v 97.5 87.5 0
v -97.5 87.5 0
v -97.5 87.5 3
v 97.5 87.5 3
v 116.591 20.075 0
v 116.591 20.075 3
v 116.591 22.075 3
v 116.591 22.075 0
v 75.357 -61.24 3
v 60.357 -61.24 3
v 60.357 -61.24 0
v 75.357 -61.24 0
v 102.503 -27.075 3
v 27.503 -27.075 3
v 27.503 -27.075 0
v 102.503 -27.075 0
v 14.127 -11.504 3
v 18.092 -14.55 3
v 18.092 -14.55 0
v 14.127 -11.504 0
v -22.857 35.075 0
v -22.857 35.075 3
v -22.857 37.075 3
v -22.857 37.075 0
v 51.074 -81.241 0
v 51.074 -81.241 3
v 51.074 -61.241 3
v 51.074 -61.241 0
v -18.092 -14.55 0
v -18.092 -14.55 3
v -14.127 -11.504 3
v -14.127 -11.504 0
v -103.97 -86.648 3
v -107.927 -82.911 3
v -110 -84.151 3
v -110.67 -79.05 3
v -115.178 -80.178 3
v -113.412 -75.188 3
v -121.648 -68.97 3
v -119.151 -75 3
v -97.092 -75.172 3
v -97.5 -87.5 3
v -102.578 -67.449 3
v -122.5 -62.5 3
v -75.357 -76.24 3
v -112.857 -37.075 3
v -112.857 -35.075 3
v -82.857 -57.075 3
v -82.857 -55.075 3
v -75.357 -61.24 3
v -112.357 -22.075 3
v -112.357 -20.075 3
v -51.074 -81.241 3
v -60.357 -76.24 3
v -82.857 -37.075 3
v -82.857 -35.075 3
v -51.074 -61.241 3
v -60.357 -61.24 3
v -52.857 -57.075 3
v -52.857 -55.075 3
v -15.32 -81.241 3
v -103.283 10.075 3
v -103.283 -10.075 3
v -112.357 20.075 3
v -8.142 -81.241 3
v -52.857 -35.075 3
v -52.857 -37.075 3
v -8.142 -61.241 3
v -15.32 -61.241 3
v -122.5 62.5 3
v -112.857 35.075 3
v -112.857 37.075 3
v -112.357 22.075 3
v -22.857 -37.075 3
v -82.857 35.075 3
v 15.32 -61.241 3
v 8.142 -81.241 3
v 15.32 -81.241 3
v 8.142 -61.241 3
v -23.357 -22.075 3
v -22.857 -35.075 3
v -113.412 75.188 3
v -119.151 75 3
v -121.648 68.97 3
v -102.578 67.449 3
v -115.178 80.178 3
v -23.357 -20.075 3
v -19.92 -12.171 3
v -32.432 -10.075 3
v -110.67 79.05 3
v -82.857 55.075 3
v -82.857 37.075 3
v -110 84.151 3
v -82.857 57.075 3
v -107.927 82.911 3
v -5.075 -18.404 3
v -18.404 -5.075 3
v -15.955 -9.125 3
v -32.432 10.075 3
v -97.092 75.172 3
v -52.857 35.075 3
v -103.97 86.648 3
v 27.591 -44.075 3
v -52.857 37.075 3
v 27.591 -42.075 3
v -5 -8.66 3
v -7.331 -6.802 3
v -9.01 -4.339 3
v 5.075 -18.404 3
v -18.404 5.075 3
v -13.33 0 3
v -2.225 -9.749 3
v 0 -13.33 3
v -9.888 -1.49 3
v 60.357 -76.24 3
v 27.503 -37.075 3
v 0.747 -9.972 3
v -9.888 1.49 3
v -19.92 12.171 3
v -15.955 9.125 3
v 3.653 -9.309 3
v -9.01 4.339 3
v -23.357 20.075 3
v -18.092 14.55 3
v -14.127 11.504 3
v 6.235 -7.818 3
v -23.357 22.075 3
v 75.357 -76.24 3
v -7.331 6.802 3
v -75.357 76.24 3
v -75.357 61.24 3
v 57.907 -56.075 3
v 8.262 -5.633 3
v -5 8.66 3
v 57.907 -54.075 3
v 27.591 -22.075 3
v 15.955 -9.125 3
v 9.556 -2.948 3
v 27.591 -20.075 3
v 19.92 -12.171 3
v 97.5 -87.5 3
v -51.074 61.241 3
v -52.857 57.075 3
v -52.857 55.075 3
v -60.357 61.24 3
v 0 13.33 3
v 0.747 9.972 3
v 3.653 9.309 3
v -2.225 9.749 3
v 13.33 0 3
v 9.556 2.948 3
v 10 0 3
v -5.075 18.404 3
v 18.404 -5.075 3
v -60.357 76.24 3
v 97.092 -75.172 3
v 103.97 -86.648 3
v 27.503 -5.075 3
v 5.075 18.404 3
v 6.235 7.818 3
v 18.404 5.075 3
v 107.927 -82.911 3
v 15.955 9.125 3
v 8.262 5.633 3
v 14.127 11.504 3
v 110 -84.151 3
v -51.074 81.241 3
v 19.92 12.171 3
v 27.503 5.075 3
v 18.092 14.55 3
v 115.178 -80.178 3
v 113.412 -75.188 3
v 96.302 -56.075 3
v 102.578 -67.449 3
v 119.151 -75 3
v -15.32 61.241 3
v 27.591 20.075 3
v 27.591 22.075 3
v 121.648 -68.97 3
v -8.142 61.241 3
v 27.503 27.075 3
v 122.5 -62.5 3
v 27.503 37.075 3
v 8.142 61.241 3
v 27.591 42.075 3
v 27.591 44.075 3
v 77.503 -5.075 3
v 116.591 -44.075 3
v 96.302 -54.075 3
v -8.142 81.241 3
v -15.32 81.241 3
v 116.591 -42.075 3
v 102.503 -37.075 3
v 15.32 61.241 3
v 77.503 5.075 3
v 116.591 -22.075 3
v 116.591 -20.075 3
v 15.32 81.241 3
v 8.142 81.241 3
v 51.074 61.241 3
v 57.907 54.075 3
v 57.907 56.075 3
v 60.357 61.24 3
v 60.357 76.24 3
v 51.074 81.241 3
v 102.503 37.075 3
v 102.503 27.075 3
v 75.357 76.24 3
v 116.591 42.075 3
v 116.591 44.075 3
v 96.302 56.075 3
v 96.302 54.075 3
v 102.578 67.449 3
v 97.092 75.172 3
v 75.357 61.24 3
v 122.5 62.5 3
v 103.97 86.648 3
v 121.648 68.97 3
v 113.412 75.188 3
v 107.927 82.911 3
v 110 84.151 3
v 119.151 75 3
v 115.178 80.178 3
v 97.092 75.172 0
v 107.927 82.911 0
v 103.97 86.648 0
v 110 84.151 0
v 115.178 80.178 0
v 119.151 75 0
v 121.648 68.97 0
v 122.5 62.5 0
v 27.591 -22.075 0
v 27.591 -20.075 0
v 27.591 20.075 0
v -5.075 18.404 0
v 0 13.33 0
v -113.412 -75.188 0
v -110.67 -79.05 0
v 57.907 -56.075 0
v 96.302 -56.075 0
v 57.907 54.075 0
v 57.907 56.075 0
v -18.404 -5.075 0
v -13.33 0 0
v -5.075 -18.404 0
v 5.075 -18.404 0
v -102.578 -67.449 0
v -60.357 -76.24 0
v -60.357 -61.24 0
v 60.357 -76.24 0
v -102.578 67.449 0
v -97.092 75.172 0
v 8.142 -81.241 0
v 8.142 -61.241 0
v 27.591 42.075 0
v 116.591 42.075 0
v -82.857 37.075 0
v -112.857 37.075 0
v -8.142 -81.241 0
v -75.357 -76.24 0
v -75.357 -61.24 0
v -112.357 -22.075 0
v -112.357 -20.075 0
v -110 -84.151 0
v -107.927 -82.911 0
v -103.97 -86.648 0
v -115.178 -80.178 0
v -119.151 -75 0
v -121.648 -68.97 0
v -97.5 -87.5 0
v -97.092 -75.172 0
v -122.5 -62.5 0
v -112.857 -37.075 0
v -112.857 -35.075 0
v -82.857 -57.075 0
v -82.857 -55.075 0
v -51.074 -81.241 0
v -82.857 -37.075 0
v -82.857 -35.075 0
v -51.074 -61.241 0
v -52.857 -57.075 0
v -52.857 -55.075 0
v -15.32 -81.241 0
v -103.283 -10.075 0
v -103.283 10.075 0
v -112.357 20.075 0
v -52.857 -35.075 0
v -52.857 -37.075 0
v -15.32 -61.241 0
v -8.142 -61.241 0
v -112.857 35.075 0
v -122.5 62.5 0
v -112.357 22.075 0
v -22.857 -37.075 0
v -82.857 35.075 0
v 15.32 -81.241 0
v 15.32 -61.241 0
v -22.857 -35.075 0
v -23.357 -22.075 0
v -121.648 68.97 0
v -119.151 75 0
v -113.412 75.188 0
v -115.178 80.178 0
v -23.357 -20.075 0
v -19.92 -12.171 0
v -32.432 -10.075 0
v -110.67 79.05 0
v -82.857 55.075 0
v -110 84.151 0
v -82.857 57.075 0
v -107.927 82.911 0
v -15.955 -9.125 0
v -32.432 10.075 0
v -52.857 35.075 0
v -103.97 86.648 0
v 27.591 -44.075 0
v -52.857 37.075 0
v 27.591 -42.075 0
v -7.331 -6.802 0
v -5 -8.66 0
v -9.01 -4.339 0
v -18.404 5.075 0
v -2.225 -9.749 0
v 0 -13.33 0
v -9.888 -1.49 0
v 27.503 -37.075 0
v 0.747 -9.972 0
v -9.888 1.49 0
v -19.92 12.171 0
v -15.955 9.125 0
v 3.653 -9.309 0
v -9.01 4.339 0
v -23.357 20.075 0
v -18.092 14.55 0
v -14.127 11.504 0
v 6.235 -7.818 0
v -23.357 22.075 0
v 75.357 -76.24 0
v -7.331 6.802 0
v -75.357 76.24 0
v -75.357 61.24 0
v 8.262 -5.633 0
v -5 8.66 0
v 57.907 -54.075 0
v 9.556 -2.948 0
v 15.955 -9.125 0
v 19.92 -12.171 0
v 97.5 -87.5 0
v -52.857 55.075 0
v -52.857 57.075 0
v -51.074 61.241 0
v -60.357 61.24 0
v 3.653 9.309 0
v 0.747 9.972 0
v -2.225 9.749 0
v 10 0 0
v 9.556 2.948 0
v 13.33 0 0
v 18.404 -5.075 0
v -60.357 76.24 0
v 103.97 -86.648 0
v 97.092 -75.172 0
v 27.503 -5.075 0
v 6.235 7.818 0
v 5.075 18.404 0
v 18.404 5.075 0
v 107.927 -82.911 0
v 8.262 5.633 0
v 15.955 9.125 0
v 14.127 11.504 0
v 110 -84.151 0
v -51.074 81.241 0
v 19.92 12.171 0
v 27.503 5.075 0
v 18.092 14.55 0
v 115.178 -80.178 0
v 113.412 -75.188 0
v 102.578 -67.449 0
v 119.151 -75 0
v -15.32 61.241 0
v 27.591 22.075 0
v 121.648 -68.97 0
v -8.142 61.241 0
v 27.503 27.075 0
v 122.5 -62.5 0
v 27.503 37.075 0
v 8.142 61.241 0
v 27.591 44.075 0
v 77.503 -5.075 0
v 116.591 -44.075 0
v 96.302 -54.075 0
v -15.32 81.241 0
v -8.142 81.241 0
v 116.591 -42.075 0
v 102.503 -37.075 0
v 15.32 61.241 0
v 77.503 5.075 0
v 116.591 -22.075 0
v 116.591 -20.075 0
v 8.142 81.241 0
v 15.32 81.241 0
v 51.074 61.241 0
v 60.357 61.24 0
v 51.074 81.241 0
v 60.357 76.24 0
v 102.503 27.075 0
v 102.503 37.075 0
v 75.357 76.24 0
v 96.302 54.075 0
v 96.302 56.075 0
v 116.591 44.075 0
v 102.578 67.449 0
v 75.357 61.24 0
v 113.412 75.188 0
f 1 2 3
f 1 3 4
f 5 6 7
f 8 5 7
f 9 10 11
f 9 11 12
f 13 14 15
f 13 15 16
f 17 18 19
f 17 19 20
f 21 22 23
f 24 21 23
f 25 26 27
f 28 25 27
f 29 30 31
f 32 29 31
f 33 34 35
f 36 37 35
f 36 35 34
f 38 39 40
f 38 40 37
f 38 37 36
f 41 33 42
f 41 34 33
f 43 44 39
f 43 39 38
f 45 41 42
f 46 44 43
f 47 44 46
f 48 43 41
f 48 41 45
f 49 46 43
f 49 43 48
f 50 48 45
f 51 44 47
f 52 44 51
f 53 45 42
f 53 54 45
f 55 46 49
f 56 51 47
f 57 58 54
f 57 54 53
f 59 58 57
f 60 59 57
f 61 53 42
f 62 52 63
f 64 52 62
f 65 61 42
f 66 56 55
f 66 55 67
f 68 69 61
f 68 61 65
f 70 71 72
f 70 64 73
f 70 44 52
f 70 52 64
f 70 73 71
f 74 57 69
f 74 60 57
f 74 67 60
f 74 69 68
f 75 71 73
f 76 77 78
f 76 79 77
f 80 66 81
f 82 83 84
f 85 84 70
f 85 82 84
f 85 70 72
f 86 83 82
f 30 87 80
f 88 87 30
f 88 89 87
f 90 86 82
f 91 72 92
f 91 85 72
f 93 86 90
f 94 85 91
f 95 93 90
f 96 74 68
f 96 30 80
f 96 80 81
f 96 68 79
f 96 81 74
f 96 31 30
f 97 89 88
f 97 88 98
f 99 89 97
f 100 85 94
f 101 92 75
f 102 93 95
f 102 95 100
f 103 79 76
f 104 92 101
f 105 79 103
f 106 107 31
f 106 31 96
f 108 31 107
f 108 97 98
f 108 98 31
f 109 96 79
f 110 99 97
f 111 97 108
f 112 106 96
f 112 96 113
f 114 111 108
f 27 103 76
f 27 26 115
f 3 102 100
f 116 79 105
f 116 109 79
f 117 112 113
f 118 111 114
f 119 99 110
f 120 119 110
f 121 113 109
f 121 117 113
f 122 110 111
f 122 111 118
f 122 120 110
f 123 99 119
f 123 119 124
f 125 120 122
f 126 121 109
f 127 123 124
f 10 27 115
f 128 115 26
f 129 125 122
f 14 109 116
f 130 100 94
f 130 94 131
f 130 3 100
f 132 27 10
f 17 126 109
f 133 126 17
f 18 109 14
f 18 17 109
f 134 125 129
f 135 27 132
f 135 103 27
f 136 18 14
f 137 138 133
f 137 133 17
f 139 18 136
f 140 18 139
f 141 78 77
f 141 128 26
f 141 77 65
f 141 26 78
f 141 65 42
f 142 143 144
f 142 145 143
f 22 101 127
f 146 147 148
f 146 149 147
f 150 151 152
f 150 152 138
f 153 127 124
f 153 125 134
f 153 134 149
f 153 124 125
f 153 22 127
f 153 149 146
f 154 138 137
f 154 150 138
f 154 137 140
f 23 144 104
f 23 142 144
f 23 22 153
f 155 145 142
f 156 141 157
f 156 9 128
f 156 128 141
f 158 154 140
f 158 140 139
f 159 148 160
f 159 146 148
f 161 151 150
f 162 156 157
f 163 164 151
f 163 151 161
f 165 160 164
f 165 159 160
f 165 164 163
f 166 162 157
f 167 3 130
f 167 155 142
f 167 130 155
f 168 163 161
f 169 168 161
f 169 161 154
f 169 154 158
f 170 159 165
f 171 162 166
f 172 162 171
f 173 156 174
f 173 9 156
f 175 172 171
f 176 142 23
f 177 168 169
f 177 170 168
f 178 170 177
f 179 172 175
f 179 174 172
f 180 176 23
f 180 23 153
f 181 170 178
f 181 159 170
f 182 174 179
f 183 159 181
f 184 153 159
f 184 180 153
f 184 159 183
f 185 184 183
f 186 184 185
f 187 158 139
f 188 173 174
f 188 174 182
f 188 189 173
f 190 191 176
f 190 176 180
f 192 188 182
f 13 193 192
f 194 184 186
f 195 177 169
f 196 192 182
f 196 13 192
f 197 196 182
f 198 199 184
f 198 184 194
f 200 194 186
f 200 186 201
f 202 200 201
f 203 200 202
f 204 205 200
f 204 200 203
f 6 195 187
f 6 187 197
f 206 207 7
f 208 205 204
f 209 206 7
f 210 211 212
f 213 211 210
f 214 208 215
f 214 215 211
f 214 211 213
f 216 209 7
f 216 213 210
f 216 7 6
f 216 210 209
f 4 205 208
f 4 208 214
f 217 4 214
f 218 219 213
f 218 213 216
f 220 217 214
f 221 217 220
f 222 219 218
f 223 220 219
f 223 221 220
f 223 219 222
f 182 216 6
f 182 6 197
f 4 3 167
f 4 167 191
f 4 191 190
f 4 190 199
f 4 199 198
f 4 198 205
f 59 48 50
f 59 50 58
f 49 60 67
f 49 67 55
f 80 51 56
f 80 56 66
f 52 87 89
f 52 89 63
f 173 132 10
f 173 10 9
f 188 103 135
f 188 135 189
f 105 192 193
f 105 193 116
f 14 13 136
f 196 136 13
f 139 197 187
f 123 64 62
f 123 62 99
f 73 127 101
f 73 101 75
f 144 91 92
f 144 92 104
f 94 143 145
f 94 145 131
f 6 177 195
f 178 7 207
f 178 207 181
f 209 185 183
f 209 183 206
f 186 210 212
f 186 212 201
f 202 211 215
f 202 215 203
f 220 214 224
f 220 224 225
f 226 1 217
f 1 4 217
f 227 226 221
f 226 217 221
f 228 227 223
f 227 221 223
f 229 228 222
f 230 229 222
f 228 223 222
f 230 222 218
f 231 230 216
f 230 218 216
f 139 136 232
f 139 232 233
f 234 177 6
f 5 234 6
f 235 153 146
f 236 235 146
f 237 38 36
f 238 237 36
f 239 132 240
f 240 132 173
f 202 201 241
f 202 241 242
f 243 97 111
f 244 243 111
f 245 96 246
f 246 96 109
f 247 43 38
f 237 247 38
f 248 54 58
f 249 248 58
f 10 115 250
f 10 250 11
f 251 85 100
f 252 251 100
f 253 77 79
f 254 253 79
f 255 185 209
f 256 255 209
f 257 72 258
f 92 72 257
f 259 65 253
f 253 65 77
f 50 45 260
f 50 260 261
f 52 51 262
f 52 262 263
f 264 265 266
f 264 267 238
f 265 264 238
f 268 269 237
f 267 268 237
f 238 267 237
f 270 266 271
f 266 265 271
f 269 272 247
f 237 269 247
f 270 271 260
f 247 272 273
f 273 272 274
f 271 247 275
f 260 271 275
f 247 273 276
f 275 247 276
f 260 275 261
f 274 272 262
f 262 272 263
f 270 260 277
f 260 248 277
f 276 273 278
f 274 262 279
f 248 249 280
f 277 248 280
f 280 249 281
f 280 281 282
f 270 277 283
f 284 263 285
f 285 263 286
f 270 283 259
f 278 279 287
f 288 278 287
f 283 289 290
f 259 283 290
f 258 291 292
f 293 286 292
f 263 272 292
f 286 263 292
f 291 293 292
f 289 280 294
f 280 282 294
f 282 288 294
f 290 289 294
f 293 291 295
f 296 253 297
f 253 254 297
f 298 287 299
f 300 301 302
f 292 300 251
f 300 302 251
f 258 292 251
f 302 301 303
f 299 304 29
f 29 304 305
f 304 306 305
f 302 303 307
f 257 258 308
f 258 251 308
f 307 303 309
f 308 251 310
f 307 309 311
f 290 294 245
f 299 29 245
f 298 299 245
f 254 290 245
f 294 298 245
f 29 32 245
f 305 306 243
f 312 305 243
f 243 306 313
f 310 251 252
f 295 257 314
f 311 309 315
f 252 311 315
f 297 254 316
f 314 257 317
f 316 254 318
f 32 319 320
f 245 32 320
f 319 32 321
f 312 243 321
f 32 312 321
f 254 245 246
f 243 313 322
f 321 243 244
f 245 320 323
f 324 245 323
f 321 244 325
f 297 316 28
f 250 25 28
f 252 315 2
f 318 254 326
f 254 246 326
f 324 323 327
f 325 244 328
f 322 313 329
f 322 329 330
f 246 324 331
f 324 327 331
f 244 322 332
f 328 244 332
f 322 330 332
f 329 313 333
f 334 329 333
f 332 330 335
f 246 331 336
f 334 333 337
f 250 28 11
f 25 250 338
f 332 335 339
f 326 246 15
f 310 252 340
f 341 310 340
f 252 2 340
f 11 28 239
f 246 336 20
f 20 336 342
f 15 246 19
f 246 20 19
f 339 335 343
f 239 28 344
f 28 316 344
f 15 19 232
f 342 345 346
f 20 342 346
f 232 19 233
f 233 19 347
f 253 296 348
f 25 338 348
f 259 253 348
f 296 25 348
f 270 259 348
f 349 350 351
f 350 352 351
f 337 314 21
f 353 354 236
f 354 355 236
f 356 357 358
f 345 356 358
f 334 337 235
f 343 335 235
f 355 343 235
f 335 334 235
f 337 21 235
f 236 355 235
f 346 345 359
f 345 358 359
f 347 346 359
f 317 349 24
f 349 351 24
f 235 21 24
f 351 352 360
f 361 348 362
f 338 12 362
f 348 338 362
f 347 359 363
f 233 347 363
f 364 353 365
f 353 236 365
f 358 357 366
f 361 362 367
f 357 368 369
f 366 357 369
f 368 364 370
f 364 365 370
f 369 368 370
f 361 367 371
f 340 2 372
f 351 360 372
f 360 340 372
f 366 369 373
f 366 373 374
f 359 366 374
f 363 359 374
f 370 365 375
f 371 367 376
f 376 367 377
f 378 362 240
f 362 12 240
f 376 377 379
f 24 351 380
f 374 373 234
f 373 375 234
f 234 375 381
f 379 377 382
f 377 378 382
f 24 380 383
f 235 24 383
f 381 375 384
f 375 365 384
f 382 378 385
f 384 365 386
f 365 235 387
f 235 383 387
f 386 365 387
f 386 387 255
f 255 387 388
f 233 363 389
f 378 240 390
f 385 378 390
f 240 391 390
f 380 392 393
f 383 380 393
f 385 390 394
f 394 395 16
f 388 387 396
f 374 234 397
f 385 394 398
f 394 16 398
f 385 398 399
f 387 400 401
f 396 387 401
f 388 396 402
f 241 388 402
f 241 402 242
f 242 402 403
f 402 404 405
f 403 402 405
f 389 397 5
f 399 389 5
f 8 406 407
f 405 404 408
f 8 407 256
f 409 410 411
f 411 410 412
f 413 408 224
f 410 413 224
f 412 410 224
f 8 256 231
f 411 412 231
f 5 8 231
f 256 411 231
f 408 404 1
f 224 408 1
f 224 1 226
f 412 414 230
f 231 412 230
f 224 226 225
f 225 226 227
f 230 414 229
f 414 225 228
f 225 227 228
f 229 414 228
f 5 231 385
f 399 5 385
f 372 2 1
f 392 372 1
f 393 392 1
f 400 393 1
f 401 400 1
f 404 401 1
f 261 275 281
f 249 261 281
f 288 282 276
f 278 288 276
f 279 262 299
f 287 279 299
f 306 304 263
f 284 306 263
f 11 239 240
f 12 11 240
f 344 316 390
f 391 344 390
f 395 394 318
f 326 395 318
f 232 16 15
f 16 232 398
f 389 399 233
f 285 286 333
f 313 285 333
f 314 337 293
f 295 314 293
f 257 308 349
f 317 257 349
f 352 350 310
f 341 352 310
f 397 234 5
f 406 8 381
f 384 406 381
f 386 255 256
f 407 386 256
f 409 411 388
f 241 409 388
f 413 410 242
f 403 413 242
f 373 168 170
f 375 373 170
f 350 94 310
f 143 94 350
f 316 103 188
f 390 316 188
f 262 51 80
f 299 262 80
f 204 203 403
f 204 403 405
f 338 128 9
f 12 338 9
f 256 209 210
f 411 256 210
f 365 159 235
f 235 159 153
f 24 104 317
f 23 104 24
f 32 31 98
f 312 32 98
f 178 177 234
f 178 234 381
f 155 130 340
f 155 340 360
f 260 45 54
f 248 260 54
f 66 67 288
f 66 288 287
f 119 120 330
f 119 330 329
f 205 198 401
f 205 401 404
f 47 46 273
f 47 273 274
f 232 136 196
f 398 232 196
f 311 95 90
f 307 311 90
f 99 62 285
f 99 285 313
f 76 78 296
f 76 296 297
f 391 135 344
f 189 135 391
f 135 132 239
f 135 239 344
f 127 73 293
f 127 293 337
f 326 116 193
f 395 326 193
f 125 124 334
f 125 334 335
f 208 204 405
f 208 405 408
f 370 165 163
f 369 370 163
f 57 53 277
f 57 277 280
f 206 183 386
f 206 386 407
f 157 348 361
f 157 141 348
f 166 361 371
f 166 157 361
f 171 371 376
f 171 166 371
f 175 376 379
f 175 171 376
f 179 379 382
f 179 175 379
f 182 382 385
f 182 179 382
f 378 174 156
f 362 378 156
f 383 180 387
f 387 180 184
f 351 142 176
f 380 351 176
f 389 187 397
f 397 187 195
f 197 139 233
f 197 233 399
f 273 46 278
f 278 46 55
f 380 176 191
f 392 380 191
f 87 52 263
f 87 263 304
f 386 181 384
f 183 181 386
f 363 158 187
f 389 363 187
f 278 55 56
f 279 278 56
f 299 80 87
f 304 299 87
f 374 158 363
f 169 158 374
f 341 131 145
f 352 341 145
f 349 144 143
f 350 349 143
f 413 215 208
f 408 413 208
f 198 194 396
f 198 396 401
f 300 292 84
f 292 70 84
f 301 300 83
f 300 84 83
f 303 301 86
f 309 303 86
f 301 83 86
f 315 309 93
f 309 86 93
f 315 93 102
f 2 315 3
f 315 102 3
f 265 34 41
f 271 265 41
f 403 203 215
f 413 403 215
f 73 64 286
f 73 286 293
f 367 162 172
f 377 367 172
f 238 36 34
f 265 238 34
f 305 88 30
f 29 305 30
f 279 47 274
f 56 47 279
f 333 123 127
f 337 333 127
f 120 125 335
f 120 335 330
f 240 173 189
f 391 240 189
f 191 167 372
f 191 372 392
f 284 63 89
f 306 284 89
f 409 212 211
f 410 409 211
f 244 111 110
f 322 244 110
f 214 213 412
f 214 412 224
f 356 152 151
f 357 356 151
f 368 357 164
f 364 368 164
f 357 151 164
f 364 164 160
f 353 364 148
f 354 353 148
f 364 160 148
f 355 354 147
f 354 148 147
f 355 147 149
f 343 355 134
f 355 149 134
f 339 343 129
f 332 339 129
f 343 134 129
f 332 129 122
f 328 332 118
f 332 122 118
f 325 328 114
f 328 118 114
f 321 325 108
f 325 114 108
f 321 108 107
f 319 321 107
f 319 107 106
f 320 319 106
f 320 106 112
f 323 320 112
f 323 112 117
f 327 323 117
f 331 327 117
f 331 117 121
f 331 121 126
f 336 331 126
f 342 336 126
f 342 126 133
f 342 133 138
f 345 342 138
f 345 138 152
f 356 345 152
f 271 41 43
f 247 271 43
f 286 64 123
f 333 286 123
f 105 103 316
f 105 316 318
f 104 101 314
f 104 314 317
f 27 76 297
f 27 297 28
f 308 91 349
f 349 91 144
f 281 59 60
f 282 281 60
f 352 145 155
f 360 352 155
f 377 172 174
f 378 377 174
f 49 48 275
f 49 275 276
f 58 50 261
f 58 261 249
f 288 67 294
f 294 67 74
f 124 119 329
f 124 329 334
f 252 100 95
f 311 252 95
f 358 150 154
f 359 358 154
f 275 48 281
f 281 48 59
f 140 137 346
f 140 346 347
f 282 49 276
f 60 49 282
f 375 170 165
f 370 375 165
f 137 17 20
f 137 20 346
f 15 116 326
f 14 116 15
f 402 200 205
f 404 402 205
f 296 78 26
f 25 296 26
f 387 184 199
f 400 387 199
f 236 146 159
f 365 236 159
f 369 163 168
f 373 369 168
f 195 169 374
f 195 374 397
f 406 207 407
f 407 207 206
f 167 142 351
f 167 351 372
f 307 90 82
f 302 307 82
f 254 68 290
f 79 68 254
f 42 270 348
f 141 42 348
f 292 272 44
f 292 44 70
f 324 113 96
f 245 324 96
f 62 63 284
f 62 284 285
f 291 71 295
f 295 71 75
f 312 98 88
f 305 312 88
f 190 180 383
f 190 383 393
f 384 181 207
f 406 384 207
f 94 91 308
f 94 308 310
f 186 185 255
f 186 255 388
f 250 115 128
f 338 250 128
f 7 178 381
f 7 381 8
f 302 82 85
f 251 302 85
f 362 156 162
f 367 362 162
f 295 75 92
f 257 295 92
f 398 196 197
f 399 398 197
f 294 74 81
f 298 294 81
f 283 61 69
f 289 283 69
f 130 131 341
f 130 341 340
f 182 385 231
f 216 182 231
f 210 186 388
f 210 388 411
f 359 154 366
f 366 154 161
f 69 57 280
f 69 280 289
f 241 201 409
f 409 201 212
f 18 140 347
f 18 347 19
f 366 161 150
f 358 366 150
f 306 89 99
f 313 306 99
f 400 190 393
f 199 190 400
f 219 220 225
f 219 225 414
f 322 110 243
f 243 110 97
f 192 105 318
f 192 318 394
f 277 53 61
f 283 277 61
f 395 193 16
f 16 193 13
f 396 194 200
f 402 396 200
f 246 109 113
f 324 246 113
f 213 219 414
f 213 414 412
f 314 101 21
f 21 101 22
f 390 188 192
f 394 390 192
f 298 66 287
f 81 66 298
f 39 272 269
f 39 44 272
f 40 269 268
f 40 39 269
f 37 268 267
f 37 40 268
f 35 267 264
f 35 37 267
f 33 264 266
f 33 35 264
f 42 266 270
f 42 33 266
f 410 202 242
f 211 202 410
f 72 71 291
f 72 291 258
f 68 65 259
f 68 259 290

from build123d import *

# Parameters (mm, degrees)
SKETCH1_W           = 245
SKETCH1_H           = 175
BOSS_EXTRUDE1_DEPTH = 3
SKETCH2_W           = 30
SKETCH2_H           = 2
SKETCH2_W_2         = 70.850822781
SKETCH2_H_2         = 20.149065526
SKETCH2_W_3         = 88.999828845
SKETCH2_W_4         = 16.284036158
SKETCH2_H_3         = 20
SKETCH2_W_5         = 35.753967601
SKETCH2_W_6         = 15
SKETCH2_H_4         = 15
SKETCH2_R           = 10
CUT_EXTRUDE1_DEPTH  = 151.570581456
FILLET1_R           = 25
SKETCH2_4_W         = 89
SKETCH2_4_H         = 2
SKETCH2_4_W_2       = 50
SKETCH2_4_H_2       = 10.149065526
SKETCH2_4_W_3       = 75
SKETCH2_4_H_3       = 10
SKETCH2_4_W_4       = 15
SKETCH2_4_H_4       = 15
SKETCH2_4_W_5       = 35.753967601
SKETCH2_4_H_5       = 20
SKETCH2_4_W_6       = 38.395009933
CUT_EXTRUDE2_DEPTH  = 10
SKETCH2_5_W         = 16.284036158
SKETCH2_5_H         = 20
CUT_EXTRUDE3_DEPTH  = 10
CUT_EXTRUDE4_DEPTH  = 10
CUT_EXTRUDE5_DEPTH  = 10


with BuildPart() as part:
    # Sketch1 → Boss-Extrude1 (new body)
    with BuildSketch(Plane.XY):
        Rectangle(SKETCH1_W, SKETCH1_H)
    extrude(amount=BOSS_EXTRUDE1_DEPTH)

    # Sketch2 → Cut-Extrude1 (cut, through all)
    with BuildSketch(Plane.XY.offset(3)):
        with Locations((-37.857152872, 36.074532763)):
            Rectangle(SKETCH2_W, SKETCH2_H)
        with Locations((-67.857152873, 0)):
            Rectangle(SKETCH2_W_2, SKETCH2_H_2)
        with Locations((-67.857152873, 21.074532763)):
            Rectangle(SKETCH2_W_3, SKETCH2_H)
        with Locations((-97.857152872, 36.074532763)):
            Rectangle(SKETCH2_W, SKETCH2_H)
        with Locations((-67.857152872, 56.074532763)):
            Rectangle(SKETCH2_W, SKETCH2_H)
        with Locations((0, 71.241154444)):
            Rectangle(SKETCH2_W_4, SKETCH2_H_3)
        with Locations((-33.197326406, 71.241154444)):
            Rectangle(SKETCH2_W_5, SKETCH2_H_3)
        with Locations((-67.857152872, 68.74)):
            Rectangle(SKETCH2_W_6, SKETCH2_H_4)
        Polygon((-110.669619636, 79.049728312), (-113.412388394, 75.188417537), (-102.577806523, 67.449430486), (-97.092269008, 75.172052036), (-107.926850879, 82.911039086), align=None)
        Polygon((-110.669619636, -79.049728312), (-107.926850879, -82.911039086), (-97.092269008, -75.172052036), (-102.577806523, -67.449430486), (-113.412388394, -75.188417537), align=None)
        with Locations((-67.857152872, -68.74)):
            Rectangle(SKETCH2_W_6, SKETCH2_H_4)
        with Locations((-33.197326406, -71.241154444)):
            Rectangle(SKETCH2_W_5, SKETCH2_H_3)
        with Locations((-67.857152872, -56.074532763)):
            Rectangle(SKETCH2_W, SKETCH2_H)
        with Locations((-97.857152872, -36.074532763)):
            Rectangle(SKETCH2_W, SKETCH2_H)
        with Locations((-37.857152872, -36.074532763)):
            Rectangle(SKETCH2_W, SKETCH2_H)
        with Locations((-67.857152873, -21.074532763)):
            Rectangle(SKETCH2_W_3, SKETCH2_H)
        Circle(SKETCH2_R)
    extrude(amount=-CUT_EXTRUDE1_DEPTH, mode=Mode.SUBTRACT)

    # Fillet1
    fillet1_edges = [part.edges().sort_by_distance(p)[0] for p in [
        (-122.5, -87.5, 1.5),
        (122.5, -87.5, 1.5),
        (122.5, 87.5, 1.5),
        (-122.5, 87.5, 1.5),
    ]]
    fillet(fillet1_edges, radius=FILLET1_R)

    # Sketch2<4> → Cut-Extrude2 (cut)
    with BuildSketch(Plane.XY.offset(3)):
        with Locations((72.091101618, -43.074532763)):
            Rectangle(SKETCH2_4_W, SKETCH2_4_H)
        with Locations((52.502938646, 0)):
            Rectangle(SKETCH2_4_W_2, SKETCH2_4_H_2)
        with Locations((72.091101618, -21.074532763)):
            Rectangle(SKETCH2_4_W, SKETCH2_4_H)
        with Locations((65.002938646, -32.074532763)):
            Rectangle(SKETCH2_4_W_3, SKETCH2_4_H_3)
        Polygon((97.092269008, -75.172052036), (107.926850879, -82.911039086), (113.412388394, -75.188417537), (102.577806523, -67.449430486), align=None)
        with Locations((67.857152872, -68.74)):
            Rectangle(SKETCH2_4_W_4, SKETCH2_4_H_4)
        with Locations((33.197326406, -71.241154444)):
            Rectangle(SKETCH2_4_W_5, SKETCH2_4_H_5)
        Polygon((97.092269008, 75.172052036), (102.577806523, 67.449430486), (113.412388394, 75.188417537), (107.926850879, 82.911039086), align=None)
        with Locations((67.857152872, 68.74)):
            Rectangle(SKETCH2_4_W_4, SKETCH2_4_H_4)
        with Locations((33.197326406, 71.241154444)):
            Rectangle(SKETCH2_4_W_5, SKETCH2_4_H_5)
        with Locations((72.091101618, 43.074532763)):
            Rectangle(SKETCH2_4_W, SKETCH2_4_H)
        with Locations((72.091101618, 21.074532763)):
            Rectangle(SKETCH2_4_W, SKETCH2_4_H)
        with Locations((65.002938646, 32.074532763)):
            Rectangle(SKETCH2_4_W_3, SKETCH2_4_H_3)
        with Locations((77.104345869, 55.074532763)):
            Rectangle(SKETCH2_4_W_6, SKETCH2_4_H)
        with Locations((77.104345869, -55.074532763)):
            Rectangle(SKETCH2_4_W_6, SKETCH2_4_H)
    extrude(amount=-CUT_EXTRUDE2_DEPTH, mode=Mode.SUBTRACT)

    # Sketch2<5> → Cut-Extrude3 (cut)
    with BuildSketch(Plane.XY.offset(3)):
        with Locations((0, -71.241154444)):
            Rectangle(SKETCH2_5_W, SKETCH2_5_H)
    extrude(amount=-CUT_EXTRUDE3_DEPTH, mode=Mode.SUBTRACT)

    # Sketch2<6> → Cut-Extrude4 (cut)
    with BuildSketch(Plane.XY.offset(3)):
        Polygon((-13.32970408, 0), (-18.404236844, 5.074532763), (-18.404236844, -5.074532763), align=None)
        Polygon((-5.074532763, 18.404236844), (0, 13.32970408), (5.074532763, 18.404236844), align=None)
        Polygon((18.404236844, 5.074532763), (13.32970408, 0), (18.404236844, -5.074532763), align=None)
        Polygon((5.074532763, -18.404236844), (0, -13.32970408), (-5.074532763, -18.404236844), align=None)
    extrude(amount=-CUT_EXTRUDE4_DEPTH, mode=Mode.SUBTRACT)

    # Sketch2<7> → Cut-Extrude5 (cut)
    with BuildSketch(Plane.XY.offset(3)):
        Polygon((19.919957162, -12.170770236), (15.95504041, -9.124553707), (14.127310492, -11.503503759), (18.092227245, -14.549720288), align=None)
        Polygon((19.919957162, 12.170770236), (18.092227245, 14.549720288), (14.127310492, 11.503503759), (15.95504041, 9.124553707), align=None)
        Polygon((-18.092227245, 14.549720288), (-19.919957162, 12.170770236), (-15.95504041, 9.124553707), (-14.127310492, 11.503503759), align=None)
        Polygon((-19.919957162, -12.170770236), (-18.092227245, -14.549720288), (-14.127310492, -11.503503759), (-15.95504041, -9.124553707), align=None)
    extrude(amount=-CUT_EXTRUDE5_DEPTH, mode=Mode.SUBTRACT)


solid = part.part
